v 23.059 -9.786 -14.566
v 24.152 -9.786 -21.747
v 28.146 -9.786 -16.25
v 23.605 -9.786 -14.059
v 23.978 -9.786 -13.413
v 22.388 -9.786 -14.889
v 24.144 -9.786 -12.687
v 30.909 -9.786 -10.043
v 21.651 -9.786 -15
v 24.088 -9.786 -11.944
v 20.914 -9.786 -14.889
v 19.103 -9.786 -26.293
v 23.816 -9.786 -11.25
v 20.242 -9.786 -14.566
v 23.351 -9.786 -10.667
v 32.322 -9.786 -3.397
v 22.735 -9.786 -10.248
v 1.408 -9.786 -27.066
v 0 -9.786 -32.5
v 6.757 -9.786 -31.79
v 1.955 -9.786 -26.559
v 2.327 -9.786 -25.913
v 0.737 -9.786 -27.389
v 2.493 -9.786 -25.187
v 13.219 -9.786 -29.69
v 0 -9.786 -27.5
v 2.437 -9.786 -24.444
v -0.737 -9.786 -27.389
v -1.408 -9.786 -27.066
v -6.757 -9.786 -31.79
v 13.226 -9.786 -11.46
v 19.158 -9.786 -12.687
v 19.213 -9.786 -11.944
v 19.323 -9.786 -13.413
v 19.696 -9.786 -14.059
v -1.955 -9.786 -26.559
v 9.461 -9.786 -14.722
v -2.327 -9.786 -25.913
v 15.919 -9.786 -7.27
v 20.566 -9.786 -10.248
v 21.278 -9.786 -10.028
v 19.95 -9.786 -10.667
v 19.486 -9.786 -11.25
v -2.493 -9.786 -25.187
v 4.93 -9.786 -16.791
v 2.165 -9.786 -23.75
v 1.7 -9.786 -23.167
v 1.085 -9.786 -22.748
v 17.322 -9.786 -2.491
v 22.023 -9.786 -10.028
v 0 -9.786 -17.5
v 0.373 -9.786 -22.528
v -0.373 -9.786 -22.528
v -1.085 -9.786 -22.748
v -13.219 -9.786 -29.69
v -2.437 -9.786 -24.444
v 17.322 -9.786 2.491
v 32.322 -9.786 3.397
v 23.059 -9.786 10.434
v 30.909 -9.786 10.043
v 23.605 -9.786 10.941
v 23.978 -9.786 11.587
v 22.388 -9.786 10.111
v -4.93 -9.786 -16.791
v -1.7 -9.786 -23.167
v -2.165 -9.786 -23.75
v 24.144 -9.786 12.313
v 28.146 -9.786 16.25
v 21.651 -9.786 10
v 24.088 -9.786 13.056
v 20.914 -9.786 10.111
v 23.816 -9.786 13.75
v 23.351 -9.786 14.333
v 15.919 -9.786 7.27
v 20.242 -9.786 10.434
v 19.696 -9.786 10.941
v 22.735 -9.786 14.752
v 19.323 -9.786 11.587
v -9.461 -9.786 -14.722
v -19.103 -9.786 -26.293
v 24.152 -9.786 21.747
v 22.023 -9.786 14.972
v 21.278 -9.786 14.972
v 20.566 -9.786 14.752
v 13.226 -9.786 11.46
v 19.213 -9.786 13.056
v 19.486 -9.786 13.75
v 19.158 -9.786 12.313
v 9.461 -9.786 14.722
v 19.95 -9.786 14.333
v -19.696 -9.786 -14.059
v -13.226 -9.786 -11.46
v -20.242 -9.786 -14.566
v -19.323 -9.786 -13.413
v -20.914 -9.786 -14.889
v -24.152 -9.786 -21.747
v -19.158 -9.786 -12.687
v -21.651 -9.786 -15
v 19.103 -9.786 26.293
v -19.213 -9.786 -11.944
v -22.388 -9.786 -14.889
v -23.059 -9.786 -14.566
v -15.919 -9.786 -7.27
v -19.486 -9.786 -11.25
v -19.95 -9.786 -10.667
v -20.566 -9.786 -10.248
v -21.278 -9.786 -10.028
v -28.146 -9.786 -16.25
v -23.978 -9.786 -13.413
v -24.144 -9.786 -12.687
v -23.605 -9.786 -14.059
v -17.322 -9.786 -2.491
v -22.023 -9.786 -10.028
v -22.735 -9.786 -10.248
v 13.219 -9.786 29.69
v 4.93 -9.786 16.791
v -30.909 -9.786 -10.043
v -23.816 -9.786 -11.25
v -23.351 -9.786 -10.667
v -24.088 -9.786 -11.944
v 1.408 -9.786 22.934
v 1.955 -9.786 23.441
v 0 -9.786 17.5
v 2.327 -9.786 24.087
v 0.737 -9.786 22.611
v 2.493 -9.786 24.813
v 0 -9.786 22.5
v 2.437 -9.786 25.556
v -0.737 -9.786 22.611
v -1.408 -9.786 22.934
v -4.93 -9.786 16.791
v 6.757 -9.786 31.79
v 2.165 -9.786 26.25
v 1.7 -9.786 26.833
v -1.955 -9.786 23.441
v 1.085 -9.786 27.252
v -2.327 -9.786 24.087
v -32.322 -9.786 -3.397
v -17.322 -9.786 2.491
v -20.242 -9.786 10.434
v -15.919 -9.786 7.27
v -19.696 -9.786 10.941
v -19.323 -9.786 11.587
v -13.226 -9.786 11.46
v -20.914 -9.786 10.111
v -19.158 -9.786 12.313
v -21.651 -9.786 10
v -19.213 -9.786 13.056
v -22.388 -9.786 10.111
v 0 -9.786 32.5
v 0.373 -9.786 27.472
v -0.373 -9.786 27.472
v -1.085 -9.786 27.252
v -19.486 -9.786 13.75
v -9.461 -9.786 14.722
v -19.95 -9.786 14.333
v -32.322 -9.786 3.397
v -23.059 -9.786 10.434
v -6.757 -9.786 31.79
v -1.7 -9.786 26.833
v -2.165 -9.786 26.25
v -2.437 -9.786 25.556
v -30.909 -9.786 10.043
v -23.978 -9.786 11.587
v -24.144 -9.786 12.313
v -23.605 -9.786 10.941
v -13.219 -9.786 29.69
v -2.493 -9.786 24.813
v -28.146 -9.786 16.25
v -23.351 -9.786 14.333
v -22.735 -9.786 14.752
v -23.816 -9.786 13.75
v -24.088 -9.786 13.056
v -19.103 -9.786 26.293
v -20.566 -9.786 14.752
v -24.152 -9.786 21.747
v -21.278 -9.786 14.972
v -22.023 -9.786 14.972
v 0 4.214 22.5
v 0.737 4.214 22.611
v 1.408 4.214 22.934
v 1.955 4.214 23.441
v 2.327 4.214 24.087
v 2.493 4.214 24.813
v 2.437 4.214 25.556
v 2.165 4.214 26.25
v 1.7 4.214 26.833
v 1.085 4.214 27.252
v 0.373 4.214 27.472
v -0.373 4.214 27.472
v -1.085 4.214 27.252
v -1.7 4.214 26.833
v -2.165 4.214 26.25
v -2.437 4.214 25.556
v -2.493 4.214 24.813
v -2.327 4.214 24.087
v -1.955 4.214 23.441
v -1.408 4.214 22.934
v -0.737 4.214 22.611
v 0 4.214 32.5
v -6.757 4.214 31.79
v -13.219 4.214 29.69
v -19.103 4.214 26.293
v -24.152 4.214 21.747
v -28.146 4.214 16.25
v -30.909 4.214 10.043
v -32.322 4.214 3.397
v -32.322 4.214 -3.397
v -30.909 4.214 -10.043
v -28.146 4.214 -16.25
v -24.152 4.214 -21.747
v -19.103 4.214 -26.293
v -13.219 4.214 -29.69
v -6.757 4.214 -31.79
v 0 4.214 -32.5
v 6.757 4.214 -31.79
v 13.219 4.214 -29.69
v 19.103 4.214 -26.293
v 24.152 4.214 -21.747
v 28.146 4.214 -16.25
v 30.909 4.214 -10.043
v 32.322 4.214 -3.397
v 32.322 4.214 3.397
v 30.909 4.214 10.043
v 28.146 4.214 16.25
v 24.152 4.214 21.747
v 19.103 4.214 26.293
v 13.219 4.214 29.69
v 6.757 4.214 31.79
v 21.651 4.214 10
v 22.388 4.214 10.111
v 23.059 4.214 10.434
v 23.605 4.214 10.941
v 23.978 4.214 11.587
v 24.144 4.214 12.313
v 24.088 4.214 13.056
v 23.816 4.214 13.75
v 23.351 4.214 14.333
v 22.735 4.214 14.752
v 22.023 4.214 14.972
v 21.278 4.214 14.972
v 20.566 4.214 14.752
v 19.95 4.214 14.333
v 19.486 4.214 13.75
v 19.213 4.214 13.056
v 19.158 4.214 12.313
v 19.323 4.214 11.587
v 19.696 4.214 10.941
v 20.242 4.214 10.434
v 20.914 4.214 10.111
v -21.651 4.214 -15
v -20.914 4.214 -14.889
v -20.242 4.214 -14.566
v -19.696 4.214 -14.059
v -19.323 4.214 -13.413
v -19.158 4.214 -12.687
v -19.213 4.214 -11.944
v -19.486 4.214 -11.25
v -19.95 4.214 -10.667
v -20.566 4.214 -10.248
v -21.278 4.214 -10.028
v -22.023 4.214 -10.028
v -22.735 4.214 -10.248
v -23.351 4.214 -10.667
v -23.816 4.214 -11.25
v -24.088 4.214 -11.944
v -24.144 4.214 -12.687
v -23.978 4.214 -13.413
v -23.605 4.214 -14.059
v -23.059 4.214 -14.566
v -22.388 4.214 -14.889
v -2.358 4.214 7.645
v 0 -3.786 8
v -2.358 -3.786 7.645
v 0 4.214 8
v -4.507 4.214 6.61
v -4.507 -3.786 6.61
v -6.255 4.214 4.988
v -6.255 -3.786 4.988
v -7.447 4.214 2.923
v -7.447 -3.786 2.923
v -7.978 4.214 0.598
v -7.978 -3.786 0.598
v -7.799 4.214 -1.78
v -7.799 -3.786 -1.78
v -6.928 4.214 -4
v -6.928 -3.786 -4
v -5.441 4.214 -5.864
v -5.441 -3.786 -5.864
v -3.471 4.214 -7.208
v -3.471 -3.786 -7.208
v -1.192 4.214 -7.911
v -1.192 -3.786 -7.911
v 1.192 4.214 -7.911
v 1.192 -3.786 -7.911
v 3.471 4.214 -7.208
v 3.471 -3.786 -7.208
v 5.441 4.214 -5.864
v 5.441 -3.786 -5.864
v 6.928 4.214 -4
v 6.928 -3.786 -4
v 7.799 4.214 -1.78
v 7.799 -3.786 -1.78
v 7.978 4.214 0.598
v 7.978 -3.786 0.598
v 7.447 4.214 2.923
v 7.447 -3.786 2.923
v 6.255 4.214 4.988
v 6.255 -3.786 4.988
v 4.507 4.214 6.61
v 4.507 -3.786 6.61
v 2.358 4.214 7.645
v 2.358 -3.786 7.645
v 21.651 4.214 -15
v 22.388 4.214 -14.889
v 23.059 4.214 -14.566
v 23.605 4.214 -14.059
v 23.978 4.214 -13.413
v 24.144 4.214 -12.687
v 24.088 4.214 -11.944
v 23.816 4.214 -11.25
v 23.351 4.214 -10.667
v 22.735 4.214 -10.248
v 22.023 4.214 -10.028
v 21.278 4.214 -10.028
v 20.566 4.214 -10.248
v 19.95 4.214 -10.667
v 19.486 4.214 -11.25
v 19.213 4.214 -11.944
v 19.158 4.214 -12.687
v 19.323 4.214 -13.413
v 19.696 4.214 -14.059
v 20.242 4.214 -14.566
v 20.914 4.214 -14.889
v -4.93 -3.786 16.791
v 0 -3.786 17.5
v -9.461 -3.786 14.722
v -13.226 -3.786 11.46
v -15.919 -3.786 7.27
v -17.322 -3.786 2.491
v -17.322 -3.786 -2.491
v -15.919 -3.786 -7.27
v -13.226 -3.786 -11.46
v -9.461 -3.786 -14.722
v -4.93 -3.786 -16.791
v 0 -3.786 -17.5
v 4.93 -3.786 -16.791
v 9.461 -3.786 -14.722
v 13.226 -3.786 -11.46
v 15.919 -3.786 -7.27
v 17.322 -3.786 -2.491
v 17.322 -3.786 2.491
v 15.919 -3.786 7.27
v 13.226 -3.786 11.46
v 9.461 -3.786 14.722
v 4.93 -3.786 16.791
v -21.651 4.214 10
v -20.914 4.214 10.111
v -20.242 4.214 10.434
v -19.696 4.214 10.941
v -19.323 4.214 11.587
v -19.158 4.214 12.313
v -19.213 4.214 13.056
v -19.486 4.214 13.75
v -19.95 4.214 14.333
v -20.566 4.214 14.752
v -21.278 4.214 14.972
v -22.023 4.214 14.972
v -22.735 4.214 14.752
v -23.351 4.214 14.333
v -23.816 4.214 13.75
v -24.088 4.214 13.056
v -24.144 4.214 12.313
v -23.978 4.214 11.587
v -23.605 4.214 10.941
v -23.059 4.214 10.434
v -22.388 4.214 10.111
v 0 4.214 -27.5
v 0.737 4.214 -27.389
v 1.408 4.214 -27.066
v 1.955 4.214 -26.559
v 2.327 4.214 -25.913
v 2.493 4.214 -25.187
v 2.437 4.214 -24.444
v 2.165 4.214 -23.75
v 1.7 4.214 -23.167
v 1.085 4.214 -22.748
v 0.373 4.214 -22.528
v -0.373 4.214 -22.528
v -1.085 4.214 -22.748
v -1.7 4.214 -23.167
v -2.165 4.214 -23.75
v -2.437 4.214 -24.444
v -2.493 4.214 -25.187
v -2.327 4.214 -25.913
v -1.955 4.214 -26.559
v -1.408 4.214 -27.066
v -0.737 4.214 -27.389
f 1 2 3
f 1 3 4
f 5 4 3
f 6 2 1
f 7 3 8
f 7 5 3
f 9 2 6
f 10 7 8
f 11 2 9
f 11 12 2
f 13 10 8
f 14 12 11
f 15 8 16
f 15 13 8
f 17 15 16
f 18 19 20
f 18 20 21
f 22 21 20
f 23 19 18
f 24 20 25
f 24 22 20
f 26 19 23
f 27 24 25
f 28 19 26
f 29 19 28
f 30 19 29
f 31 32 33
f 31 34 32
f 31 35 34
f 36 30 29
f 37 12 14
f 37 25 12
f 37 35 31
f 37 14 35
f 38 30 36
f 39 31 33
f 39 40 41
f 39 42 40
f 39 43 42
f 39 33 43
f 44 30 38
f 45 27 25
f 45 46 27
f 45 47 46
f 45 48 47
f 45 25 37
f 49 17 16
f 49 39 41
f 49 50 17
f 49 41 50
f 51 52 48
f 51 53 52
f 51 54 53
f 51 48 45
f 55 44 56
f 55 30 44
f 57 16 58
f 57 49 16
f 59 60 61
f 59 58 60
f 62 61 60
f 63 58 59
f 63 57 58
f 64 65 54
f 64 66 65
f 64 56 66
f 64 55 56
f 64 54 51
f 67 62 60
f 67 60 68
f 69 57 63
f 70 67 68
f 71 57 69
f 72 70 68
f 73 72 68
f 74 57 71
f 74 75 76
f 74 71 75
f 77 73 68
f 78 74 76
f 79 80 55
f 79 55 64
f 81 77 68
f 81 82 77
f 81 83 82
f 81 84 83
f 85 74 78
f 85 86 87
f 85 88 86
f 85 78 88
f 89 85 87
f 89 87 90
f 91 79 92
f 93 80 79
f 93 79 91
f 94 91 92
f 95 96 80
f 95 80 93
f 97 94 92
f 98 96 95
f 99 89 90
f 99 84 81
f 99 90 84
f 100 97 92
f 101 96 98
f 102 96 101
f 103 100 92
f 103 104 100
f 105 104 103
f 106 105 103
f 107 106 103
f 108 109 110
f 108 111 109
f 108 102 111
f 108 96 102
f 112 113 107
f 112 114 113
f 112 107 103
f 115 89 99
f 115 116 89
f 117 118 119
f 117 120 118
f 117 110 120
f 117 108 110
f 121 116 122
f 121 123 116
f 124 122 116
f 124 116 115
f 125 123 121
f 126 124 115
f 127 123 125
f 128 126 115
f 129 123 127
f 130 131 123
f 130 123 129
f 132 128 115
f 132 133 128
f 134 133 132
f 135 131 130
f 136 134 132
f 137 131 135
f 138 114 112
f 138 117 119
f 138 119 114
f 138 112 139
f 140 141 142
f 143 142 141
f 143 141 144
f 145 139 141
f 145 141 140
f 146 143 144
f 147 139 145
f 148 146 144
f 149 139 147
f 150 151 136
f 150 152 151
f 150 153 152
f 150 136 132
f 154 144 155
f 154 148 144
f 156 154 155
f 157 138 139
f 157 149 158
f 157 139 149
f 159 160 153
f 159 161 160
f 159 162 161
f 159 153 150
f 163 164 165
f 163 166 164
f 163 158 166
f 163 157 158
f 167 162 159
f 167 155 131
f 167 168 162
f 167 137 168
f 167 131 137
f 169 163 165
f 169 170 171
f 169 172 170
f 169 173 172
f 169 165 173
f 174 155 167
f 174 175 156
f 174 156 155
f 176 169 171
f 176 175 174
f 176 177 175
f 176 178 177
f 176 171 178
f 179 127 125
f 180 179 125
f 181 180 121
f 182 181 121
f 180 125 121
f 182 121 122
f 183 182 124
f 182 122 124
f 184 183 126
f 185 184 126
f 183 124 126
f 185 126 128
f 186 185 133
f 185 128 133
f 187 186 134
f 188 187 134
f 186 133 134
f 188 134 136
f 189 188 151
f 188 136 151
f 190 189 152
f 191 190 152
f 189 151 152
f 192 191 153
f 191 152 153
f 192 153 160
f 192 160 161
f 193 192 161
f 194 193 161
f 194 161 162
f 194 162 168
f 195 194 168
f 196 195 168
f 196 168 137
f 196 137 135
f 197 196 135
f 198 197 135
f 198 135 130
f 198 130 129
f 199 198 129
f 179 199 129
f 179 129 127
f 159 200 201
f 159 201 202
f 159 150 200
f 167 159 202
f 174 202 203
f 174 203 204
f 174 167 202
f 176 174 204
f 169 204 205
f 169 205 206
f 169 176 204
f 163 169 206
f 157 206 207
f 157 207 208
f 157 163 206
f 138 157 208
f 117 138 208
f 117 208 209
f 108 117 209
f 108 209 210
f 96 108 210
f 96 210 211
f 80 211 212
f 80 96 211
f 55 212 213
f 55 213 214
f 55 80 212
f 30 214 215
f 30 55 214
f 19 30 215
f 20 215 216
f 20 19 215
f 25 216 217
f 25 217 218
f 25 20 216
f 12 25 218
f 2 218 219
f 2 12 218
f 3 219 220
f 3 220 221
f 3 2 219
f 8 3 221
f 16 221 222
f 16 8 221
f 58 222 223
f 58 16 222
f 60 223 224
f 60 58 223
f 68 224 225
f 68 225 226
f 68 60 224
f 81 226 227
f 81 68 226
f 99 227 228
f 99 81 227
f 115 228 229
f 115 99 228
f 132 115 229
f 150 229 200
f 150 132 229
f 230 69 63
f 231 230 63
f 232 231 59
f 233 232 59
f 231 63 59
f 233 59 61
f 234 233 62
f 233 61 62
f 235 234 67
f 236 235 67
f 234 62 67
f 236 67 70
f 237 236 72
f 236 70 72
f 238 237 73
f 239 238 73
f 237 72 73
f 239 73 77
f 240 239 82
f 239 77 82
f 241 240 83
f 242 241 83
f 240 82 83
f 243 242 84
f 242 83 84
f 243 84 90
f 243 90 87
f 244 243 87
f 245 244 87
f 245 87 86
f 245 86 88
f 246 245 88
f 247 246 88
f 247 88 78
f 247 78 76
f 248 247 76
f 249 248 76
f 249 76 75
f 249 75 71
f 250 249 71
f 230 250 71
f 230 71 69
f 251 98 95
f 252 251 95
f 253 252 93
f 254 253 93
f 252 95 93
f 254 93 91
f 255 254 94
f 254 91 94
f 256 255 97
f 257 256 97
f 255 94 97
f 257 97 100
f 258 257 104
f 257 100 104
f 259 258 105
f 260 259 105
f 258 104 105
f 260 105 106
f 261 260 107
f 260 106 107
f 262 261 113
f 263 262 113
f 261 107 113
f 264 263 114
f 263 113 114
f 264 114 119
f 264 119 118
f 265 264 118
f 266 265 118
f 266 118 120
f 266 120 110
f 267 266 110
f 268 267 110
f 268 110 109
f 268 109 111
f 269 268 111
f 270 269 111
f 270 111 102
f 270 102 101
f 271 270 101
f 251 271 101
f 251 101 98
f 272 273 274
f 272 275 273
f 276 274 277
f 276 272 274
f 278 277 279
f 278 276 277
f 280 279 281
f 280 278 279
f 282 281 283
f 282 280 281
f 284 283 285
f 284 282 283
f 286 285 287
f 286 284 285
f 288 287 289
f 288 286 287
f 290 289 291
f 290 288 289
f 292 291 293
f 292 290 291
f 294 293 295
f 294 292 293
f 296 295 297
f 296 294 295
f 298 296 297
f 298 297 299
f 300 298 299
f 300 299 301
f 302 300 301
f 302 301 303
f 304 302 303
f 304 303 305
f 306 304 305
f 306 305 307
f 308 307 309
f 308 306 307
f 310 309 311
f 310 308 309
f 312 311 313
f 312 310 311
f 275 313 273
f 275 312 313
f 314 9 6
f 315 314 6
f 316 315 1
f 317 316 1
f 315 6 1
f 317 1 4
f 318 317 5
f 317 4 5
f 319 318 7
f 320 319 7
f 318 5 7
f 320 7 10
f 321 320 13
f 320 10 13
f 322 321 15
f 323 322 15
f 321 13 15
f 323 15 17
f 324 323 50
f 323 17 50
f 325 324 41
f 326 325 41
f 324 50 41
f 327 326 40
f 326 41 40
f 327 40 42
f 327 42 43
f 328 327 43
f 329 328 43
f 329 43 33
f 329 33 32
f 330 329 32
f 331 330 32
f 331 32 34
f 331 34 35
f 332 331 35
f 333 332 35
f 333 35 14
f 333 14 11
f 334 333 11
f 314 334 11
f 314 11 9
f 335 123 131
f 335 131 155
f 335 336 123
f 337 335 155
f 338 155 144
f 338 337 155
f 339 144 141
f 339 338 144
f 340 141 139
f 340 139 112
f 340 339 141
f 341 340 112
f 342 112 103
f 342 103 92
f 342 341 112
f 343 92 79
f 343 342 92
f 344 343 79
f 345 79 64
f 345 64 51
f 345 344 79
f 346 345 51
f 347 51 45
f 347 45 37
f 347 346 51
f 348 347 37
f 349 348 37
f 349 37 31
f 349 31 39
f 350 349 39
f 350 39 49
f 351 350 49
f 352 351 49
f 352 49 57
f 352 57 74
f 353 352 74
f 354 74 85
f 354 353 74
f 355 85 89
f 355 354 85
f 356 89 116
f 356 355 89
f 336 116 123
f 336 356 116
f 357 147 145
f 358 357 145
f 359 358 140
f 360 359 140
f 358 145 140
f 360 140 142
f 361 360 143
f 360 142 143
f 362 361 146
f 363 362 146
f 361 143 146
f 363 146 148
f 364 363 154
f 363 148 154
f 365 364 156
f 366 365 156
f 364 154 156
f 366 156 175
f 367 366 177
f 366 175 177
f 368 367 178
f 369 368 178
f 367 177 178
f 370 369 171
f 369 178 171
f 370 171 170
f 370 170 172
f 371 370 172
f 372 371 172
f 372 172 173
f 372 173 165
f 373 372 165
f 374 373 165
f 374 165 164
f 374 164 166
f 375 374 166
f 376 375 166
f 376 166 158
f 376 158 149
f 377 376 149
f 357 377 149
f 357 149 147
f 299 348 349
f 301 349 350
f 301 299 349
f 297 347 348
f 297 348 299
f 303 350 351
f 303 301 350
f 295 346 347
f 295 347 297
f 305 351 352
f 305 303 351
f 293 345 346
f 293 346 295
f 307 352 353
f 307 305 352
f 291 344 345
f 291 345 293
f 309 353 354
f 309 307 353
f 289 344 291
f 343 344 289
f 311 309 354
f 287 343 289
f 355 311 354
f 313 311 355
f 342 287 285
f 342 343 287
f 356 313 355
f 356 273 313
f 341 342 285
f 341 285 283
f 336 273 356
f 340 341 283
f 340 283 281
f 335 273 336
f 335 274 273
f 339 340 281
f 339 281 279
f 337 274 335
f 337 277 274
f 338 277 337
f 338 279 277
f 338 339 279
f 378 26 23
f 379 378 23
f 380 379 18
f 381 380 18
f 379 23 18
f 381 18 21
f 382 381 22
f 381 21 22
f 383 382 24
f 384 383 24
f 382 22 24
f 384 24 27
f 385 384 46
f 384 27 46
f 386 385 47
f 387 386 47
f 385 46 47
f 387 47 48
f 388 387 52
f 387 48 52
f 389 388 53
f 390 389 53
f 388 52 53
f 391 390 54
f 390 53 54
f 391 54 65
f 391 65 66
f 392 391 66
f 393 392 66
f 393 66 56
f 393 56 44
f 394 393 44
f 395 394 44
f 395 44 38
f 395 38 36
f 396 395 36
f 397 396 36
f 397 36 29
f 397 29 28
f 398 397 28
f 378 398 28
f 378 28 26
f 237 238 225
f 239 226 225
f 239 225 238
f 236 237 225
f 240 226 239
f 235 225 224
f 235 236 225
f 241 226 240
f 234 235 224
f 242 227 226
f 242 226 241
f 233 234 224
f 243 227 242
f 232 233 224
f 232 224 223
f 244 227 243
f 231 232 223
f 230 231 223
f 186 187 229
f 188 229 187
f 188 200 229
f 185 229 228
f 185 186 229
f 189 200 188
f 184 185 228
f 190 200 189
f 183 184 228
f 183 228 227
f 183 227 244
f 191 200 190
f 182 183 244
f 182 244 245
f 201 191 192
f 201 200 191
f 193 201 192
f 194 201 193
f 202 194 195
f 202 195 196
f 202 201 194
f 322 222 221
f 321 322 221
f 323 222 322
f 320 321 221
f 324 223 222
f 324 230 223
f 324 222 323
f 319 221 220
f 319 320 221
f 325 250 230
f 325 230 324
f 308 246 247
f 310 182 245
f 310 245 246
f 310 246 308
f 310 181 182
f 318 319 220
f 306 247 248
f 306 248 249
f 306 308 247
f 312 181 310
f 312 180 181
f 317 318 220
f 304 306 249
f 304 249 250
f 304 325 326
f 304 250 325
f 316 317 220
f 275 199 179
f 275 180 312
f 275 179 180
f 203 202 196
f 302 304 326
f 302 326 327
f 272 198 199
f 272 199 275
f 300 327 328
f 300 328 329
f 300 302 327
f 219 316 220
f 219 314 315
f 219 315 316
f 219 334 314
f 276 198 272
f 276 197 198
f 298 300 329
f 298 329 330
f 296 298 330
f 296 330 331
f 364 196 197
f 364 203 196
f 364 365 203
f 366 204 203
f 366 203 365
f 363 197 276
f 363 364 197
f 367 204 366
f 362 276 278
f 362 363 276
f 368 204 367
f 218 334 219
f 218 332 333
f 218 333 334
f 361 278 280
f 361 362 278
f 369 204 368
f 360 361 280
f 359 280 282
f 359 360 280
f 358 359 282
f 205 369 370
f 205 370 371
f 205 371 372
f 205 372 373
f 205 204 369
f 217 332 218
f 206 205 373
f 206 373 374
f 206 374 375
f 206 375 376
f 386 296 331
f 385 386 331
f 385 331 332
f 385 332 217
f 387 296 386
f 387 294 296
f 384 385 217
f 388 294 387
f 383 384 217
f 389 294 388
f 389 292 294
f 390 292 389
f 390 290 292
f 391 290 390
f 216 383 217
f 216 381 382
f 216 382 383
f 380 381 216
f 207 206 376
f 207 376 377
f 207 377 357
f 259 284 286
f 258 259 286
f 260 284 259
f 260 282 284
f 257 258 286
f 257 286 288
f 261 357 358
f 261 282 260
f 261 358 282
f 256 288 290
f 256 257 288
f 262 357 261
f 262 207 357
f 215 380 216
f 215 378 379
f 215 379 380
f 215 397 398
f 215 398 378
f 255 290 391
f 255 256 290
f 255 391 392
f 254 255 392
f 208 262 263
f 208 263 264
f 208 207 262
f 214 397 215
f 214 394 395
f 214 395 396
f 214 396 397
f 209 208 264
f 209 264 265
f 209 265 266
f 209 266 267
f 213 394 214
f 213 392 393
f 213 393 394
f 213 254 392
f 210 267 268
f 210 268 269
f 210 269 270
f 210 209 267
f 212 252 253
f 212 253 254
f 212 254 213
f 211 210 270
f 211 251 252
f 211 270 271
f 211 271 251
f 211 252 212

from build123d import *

# Parameters (mm, degrees)
SKETCH2_R          = 2.5
CUT_EXTRUDE1_DEPTH = 23


with BuildPart() as part:
    # Sketch1 → Revolve1 (revolve)
    with BuildSketch(Plane.XY, mode=Mode.PRIVATE) as revolve1_sk:
        Polygon((-8, 4.214497041), (-32.5, 4.214497041), (-32.5, -9.785502959), (-17.5, -9.785502959), (-17.5, -3.785502959), (-8, -3.785502959), align=None)
    revolve(revolve1_sk.sketch.rotate(Axis((0, 16.708579882, 0), (0, -1, 0)), 270), axis=Axis((0, 16.708579882, 0), (0, -1, 0)))

    # Sketch2 → Cut-Extrude1 (cut)
    with BuildSketch(Plane.XZ.offset(9.785502959)):
        with Locations(Location((0, 25, 0), (0, 0, 270))):
            Circle(SKETCH2_R)
        with Locations(Location((21.650635095, 12.5, 0), (0, 0, 270))):
            Circle(SKETCH2_R)
        with Locations(Location((21.650635095, -12.5, 0), (0, 0, 270))):
            Circle(SKETCH2_R)
        with Locations(Location((0, -25, 0), (0, 0, 270))):
            Circle(SKETCH2_R)
        with Locations(Location((-21.650635095, -12.5, 0), (0, 0, 270))):
            Circle(SKETCH2_R)
        with Locations(Location((-21.650635095, 12.5, 0), (0, 0, 270))):
            Circle(SKETCH2_R)
    extrude(amount=-CUT_EXTRUDE1_DEPTH, mode=Mode.SUBTRACT)


solid = part.part
